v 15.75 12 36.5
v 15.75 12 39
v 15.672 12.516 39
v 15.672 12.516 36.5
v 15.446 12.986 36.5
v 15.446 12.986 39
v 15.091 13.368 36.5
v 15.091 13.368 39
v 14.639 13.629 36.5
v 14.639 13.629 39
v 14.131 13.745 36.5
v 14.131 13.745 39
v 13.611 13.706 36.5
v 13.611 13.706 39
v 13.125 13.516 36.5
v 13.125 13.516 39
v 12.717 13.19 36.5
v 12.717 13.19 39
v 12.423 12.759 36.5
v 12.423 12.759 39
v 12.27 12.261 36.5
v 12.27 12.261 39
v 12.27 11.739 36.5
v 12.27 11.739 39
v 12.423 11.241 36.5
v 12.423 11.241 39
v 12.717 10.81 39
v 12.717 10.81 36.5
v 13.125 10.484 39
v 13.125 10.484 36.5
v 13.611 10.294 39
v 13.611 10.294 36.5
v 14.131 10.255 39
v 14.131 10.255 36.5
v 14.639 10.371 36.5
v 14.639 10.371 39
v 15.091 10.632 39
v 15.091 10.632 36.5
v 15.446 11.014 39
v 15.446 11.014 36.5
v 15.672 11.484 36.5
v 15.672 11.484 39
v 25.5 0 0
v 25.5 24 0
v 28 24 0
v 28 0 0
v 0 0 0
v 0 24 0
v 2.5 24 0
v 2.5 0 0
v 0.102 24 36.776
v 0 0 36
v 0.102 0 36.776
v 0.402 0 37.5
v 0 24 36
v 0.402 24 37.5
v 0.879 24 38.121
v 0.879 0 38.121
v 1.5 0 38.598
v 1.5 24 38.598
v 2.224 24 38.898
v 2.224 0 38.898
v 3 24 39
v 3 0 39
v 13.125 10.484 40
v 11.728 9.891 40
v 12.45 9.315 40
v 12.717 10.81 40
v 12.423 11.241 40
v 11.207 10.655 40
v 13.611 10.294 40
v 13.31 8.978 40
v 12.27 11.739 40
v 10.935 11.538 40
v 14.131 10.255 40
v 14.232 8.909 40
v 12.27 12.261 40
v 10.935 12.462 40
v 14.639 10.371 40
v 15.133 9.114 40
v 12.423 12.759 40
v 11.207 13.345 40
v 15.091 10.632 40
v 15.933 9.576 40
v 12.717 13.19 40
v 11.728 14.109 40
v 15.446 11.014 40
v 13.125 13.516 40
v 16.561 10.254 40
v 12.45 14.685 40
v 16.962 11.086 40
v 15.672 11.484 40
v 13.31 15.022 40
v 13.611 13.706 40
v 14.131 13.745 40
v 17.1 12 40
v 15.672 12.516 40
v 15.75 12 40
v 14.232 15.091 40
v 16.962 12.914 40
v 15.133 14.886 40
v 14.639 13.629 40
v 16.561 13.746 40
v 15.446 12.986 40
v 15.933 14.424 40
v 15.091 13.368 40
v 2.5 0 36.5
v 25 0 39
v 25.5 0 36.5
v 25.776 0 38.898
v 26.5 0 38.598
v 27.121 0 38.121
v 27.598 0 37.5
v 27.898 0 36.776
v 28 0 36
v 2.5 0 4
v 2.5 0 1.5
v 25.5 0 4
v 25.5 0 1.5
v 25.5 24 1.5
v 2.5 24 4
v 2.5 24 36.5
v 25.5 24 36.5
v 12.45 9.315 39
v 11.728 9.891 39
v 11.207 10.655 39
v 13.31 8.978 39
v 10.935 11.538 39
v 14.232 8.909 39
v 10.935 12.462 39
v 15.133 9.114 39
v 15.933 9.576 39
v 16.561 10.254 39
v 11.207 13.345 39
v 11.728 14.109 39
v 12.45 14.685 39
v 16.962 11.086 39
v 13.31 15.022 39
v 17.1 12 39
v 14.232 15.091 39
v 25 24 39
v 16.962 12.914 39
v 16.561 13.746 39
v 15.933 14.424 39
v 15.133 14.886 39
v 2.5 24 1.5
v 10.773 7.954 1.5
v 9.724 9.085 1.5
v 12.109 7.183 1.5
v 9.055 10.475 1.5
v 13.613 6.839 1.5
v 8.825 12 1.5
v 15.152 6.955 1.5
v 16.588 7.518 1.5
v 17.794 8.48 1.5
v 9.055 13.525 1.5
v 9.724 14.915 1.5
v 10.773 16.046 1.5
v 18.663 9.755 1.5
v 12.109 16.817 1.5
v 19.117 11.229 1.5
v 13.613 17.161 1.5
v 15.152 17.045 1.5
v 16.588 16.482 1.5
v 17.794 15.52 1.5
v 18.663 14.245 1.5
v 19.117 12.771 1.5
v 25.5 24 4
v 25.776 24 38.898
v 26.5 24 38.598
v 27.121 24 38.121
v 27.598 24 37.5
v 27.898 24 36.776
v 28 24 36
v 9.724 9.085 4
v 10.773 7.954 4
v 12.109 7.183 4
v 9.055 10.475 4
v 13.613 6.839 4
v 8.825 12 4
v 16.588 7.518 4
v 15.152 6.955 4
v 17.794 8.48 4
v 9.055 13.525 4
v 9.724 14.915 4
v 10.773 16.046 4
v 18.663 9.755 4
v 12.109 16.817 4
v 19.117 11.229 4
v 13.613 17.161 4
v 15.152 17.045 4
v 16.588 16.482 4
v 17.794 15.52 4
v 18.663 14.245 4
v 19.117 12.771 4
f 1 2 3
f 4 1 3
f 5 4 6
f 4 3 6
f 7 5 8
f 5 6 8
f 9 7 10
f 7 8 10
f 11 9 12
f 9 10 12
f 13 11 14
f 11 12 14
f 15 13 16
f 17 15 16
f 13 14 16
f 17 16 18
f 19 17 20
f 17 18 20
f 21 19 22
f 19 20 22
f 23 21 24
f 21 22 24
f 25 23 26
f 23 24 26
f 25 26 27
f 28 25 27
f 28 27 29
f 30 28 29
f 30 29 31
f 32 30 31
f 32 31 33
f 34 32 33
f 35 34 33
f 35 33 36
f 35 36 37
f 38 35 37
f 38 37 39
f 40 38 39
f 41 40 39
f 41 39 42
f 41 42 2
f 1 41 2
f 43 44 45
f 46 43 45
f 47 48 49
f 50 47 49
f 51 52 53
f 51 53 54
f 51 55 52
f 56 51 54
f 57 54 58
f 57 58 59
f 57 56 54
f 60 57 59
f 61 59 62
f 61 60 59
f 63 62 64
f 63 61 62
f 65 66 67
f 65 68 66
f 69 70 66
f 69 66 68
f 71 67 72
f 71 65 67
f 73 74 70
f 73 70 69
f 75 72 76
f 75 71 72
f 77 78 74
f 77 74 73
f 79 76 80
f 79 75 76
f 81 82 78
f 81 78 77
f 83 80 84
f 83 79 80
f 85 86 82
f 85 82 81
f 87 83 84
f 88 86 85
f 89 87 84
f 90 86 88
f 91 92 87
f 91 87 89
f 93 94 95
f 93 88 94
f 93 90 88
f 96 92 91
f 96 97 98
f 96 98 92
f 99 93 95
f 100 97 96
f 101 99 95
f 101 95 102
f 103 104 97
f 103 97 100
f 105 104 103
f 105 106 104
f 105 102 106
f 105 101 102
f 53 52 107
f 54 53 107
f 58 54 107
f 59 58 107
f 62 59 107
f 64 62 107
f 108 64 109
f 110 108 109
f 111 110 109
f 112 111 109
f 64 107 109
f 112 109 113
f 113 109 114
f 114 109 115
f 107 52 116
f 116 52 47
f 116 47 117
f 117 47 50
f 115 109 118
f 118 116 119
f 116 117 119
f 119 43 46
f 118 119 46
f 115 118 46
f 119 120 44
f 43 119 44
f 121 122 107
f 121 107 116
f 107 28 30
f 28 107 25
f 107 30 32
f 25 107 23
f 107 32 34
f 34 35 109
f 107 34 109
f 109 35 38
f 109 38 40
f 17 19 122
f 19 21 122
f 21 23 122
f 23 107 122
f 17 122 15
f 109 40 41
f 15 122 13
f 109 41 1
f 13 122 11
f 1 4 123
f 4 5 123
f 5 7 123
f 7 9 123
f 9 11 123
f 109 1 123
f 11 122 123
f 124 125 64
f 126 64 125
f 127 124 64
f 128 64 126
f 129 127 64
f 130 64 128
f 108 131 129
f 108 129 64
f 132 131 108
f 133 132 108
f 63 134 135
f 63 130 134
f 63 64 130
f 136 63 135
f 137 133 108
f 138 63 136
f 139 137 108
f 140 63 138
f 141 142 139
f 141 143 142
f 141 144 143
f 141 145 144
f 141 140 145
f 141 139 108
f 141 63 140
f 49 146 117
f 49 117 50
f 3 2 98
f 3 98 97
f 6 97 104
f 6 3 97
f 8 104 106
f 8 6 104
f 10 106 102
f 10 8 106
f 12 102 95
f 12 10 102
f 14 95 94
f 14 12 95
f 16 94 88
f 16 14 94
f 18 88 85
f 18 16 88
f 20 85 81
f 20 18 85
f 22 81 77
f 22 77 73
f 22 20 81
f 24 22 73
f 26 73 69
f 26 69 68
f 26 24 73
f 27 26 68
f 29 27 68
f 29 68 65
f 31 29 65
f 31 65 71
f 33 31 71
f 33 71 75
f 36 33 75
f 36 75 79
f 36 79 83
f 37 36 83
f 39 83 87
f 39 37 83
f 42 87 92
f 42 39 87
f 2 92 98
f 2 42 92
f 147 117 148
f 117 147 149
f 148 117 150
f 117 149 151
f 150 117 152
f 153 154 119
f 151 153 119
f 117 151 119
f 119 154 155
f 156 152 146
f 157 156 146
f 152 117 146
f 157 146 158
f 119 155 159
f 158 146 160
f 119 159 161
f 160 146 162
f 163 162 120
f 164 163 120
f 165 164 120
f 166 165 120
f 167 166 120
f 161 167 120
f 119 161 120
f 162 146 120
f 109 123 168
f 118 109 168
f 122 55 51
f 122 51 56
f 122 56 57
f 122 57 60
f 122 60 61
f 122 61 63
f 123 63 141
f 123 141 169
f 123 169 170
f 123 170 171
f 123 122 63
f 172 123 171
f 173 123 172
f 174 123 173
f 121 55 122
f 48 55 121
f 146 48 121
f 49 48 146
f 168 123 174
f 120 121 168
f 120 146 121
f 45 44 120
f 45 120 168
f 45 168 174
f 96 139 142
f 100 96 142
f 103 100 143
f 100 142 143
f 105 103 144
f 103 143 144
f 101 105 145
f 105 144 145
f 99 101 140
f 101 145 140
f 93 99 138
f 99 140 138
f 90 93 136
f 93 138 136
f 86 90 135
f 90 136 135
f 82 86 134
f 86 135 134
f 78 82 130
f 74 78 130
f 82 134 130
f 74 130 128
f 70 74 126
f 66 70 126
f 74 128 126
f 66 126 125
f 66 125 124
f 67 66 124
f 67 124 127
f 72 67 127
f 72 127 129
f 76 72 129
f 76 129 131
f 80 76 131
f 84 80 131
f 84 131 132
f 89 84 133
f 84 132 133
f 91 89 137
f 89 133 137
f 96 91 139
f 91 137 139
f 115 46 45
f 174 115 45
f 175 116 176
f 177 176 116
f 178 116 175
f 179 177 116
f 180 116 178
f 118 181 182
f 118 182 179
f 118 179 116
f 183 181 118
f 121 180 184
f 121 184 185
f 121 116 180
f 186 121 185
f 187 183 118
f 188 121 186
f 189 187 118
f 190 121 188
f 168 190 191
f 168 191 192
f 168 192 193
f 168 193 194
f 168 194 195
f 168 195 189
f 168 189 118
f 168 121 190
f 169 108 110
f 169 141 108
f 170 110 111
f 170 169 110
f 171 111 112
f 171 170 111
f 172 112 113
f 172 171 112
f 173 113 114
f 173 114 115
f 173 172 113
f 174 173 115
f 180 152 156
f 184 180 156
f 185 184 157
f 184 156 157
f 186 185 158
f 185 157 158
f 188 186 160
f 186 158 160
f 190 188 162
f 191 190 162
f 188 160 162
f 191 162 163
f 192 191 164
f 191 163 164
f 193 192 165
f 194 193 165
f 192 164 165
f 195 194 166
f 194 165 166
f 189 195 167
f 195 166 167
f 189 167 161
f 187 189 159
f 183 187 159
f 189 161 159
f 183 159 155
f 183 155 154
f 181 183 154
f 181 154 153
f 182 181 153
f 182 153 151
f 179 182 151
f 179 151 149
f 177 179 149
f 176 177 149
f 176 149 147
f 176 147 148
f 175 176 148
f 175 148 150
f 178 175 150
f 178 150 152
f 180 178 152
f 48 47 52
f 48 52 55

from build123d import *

# Parameters (mm, degrees)
SKETCH1_W           = 28
SKETCH1_H           = 24
BOSS_EXTRUDE1_DEPTH = 39
SKETCH2_W           = 23
SKETCH2_H           = 32.5
SKETCH2_H_2         = 1.5
CUT_EXTRUDE1_DEPTH  = 25
CUT_EXTRUDE2_REACH  = 41
SKETCH3_R           = 5.175
CUT_EXTRUDE3_REACH  = 41
SKETCH4_R           = 1.75
FILLET1_R           = 3
SKETCH5_R           = 3.1
SKETCH5_R_2         = 1.75
BOSS_EXTRUDE2_DEPTH = 1


with BuildPart() as part:
    # Sketch1 → Boss-Extrude1 (new body)
    with BuildSketch(Plane.XY):
        with Locations((14, 12)):
            Rectangle(SKETCH1_W, SKETCH1_H)
    extrude(amount=BOSS_EXTRUDE1_DEPTH)

    # Sketch2 → Cut-Extrude1 (cut, through all)
    with BuildSketch(Plane(origin=(0, 24, 0), x_dir=(1, 0, 0), z_dir=(0, 1, 0))):
        with Locations((14, -20.25)):
            Rectangle(SKETCH2_W, SKETCH2_H)
        with Locations((14, -0.75)):
            Rectangle(SKETCH2_W, SKETCH2_H_2)
    extrude(amount=-CUT_EXTRUDE1_DEPTH, mode=Mode.SUBTRACT)

    # Sketch3 → Cut-Extrude2 (cut, up to next)
    with BuildSketch(Plane(origin=(0, 0, 0), x_dir=(-1, 0, 0), z_dir=(0, 0, -1)), mode=Mode.PRIVATE) as cut_extrude2_sk1:
        with Locations((-14, 12)):
            Circle(SKETCH3_R)
    cut_extrude2_tool1 = extrude(cut_extrude2_sk1.sketch, amount=-CUT_EXTRUDE2_REACH, mode=Mode.PRIVATE) & part.part
    add(cut_extrude2_tool1.solids().sort_by_distance((14, 12, 0))[0], mode=Mode.SUBTRACT)

    # Sketch4 → Cut-Extrude3 (cut, up to next)
    with BuildSketch(Plane.XY.offset(39), mode=Mode.PRIVATE) as cut_extrude3_sk1:
        with Locations((14, 12)):
            Circle(SKETCH4_R)
    cut_extrude3_tool1 = extrude(cut_extrude3_sk1.sketch, amount=-CUT_EXTRUDE3_REACH, mode=Mode.PRIVATE) & part.part
    add(cut_extrude3_tool1.solids().sort_by_distance((14, 12, 39))[0], mode=Mode.SUBTRACT)

    # Fillet1
    fillet1_edges = [part.edges().sort_by_distance(p)[0] for p in [
        (28, 12, 39),
        (0, 12, 39),
    ]]
    fillet(fillet1_edges, radius=FILLET1_R)

    # Sketch5 → Boss-Extrude2 (add)
    with BuildSketch(Plane.XY.offset(39)):
        with Locations((14, 12)):
            Circle(SKETCH5_R)
        with Locations((14, 12)):
            Circle(SKETCH5_R_2, mode=Mode.SUBTRACT)
    extrude(amount=BOSS_EXTRUDE2_DEPTH)


solid = part.part
